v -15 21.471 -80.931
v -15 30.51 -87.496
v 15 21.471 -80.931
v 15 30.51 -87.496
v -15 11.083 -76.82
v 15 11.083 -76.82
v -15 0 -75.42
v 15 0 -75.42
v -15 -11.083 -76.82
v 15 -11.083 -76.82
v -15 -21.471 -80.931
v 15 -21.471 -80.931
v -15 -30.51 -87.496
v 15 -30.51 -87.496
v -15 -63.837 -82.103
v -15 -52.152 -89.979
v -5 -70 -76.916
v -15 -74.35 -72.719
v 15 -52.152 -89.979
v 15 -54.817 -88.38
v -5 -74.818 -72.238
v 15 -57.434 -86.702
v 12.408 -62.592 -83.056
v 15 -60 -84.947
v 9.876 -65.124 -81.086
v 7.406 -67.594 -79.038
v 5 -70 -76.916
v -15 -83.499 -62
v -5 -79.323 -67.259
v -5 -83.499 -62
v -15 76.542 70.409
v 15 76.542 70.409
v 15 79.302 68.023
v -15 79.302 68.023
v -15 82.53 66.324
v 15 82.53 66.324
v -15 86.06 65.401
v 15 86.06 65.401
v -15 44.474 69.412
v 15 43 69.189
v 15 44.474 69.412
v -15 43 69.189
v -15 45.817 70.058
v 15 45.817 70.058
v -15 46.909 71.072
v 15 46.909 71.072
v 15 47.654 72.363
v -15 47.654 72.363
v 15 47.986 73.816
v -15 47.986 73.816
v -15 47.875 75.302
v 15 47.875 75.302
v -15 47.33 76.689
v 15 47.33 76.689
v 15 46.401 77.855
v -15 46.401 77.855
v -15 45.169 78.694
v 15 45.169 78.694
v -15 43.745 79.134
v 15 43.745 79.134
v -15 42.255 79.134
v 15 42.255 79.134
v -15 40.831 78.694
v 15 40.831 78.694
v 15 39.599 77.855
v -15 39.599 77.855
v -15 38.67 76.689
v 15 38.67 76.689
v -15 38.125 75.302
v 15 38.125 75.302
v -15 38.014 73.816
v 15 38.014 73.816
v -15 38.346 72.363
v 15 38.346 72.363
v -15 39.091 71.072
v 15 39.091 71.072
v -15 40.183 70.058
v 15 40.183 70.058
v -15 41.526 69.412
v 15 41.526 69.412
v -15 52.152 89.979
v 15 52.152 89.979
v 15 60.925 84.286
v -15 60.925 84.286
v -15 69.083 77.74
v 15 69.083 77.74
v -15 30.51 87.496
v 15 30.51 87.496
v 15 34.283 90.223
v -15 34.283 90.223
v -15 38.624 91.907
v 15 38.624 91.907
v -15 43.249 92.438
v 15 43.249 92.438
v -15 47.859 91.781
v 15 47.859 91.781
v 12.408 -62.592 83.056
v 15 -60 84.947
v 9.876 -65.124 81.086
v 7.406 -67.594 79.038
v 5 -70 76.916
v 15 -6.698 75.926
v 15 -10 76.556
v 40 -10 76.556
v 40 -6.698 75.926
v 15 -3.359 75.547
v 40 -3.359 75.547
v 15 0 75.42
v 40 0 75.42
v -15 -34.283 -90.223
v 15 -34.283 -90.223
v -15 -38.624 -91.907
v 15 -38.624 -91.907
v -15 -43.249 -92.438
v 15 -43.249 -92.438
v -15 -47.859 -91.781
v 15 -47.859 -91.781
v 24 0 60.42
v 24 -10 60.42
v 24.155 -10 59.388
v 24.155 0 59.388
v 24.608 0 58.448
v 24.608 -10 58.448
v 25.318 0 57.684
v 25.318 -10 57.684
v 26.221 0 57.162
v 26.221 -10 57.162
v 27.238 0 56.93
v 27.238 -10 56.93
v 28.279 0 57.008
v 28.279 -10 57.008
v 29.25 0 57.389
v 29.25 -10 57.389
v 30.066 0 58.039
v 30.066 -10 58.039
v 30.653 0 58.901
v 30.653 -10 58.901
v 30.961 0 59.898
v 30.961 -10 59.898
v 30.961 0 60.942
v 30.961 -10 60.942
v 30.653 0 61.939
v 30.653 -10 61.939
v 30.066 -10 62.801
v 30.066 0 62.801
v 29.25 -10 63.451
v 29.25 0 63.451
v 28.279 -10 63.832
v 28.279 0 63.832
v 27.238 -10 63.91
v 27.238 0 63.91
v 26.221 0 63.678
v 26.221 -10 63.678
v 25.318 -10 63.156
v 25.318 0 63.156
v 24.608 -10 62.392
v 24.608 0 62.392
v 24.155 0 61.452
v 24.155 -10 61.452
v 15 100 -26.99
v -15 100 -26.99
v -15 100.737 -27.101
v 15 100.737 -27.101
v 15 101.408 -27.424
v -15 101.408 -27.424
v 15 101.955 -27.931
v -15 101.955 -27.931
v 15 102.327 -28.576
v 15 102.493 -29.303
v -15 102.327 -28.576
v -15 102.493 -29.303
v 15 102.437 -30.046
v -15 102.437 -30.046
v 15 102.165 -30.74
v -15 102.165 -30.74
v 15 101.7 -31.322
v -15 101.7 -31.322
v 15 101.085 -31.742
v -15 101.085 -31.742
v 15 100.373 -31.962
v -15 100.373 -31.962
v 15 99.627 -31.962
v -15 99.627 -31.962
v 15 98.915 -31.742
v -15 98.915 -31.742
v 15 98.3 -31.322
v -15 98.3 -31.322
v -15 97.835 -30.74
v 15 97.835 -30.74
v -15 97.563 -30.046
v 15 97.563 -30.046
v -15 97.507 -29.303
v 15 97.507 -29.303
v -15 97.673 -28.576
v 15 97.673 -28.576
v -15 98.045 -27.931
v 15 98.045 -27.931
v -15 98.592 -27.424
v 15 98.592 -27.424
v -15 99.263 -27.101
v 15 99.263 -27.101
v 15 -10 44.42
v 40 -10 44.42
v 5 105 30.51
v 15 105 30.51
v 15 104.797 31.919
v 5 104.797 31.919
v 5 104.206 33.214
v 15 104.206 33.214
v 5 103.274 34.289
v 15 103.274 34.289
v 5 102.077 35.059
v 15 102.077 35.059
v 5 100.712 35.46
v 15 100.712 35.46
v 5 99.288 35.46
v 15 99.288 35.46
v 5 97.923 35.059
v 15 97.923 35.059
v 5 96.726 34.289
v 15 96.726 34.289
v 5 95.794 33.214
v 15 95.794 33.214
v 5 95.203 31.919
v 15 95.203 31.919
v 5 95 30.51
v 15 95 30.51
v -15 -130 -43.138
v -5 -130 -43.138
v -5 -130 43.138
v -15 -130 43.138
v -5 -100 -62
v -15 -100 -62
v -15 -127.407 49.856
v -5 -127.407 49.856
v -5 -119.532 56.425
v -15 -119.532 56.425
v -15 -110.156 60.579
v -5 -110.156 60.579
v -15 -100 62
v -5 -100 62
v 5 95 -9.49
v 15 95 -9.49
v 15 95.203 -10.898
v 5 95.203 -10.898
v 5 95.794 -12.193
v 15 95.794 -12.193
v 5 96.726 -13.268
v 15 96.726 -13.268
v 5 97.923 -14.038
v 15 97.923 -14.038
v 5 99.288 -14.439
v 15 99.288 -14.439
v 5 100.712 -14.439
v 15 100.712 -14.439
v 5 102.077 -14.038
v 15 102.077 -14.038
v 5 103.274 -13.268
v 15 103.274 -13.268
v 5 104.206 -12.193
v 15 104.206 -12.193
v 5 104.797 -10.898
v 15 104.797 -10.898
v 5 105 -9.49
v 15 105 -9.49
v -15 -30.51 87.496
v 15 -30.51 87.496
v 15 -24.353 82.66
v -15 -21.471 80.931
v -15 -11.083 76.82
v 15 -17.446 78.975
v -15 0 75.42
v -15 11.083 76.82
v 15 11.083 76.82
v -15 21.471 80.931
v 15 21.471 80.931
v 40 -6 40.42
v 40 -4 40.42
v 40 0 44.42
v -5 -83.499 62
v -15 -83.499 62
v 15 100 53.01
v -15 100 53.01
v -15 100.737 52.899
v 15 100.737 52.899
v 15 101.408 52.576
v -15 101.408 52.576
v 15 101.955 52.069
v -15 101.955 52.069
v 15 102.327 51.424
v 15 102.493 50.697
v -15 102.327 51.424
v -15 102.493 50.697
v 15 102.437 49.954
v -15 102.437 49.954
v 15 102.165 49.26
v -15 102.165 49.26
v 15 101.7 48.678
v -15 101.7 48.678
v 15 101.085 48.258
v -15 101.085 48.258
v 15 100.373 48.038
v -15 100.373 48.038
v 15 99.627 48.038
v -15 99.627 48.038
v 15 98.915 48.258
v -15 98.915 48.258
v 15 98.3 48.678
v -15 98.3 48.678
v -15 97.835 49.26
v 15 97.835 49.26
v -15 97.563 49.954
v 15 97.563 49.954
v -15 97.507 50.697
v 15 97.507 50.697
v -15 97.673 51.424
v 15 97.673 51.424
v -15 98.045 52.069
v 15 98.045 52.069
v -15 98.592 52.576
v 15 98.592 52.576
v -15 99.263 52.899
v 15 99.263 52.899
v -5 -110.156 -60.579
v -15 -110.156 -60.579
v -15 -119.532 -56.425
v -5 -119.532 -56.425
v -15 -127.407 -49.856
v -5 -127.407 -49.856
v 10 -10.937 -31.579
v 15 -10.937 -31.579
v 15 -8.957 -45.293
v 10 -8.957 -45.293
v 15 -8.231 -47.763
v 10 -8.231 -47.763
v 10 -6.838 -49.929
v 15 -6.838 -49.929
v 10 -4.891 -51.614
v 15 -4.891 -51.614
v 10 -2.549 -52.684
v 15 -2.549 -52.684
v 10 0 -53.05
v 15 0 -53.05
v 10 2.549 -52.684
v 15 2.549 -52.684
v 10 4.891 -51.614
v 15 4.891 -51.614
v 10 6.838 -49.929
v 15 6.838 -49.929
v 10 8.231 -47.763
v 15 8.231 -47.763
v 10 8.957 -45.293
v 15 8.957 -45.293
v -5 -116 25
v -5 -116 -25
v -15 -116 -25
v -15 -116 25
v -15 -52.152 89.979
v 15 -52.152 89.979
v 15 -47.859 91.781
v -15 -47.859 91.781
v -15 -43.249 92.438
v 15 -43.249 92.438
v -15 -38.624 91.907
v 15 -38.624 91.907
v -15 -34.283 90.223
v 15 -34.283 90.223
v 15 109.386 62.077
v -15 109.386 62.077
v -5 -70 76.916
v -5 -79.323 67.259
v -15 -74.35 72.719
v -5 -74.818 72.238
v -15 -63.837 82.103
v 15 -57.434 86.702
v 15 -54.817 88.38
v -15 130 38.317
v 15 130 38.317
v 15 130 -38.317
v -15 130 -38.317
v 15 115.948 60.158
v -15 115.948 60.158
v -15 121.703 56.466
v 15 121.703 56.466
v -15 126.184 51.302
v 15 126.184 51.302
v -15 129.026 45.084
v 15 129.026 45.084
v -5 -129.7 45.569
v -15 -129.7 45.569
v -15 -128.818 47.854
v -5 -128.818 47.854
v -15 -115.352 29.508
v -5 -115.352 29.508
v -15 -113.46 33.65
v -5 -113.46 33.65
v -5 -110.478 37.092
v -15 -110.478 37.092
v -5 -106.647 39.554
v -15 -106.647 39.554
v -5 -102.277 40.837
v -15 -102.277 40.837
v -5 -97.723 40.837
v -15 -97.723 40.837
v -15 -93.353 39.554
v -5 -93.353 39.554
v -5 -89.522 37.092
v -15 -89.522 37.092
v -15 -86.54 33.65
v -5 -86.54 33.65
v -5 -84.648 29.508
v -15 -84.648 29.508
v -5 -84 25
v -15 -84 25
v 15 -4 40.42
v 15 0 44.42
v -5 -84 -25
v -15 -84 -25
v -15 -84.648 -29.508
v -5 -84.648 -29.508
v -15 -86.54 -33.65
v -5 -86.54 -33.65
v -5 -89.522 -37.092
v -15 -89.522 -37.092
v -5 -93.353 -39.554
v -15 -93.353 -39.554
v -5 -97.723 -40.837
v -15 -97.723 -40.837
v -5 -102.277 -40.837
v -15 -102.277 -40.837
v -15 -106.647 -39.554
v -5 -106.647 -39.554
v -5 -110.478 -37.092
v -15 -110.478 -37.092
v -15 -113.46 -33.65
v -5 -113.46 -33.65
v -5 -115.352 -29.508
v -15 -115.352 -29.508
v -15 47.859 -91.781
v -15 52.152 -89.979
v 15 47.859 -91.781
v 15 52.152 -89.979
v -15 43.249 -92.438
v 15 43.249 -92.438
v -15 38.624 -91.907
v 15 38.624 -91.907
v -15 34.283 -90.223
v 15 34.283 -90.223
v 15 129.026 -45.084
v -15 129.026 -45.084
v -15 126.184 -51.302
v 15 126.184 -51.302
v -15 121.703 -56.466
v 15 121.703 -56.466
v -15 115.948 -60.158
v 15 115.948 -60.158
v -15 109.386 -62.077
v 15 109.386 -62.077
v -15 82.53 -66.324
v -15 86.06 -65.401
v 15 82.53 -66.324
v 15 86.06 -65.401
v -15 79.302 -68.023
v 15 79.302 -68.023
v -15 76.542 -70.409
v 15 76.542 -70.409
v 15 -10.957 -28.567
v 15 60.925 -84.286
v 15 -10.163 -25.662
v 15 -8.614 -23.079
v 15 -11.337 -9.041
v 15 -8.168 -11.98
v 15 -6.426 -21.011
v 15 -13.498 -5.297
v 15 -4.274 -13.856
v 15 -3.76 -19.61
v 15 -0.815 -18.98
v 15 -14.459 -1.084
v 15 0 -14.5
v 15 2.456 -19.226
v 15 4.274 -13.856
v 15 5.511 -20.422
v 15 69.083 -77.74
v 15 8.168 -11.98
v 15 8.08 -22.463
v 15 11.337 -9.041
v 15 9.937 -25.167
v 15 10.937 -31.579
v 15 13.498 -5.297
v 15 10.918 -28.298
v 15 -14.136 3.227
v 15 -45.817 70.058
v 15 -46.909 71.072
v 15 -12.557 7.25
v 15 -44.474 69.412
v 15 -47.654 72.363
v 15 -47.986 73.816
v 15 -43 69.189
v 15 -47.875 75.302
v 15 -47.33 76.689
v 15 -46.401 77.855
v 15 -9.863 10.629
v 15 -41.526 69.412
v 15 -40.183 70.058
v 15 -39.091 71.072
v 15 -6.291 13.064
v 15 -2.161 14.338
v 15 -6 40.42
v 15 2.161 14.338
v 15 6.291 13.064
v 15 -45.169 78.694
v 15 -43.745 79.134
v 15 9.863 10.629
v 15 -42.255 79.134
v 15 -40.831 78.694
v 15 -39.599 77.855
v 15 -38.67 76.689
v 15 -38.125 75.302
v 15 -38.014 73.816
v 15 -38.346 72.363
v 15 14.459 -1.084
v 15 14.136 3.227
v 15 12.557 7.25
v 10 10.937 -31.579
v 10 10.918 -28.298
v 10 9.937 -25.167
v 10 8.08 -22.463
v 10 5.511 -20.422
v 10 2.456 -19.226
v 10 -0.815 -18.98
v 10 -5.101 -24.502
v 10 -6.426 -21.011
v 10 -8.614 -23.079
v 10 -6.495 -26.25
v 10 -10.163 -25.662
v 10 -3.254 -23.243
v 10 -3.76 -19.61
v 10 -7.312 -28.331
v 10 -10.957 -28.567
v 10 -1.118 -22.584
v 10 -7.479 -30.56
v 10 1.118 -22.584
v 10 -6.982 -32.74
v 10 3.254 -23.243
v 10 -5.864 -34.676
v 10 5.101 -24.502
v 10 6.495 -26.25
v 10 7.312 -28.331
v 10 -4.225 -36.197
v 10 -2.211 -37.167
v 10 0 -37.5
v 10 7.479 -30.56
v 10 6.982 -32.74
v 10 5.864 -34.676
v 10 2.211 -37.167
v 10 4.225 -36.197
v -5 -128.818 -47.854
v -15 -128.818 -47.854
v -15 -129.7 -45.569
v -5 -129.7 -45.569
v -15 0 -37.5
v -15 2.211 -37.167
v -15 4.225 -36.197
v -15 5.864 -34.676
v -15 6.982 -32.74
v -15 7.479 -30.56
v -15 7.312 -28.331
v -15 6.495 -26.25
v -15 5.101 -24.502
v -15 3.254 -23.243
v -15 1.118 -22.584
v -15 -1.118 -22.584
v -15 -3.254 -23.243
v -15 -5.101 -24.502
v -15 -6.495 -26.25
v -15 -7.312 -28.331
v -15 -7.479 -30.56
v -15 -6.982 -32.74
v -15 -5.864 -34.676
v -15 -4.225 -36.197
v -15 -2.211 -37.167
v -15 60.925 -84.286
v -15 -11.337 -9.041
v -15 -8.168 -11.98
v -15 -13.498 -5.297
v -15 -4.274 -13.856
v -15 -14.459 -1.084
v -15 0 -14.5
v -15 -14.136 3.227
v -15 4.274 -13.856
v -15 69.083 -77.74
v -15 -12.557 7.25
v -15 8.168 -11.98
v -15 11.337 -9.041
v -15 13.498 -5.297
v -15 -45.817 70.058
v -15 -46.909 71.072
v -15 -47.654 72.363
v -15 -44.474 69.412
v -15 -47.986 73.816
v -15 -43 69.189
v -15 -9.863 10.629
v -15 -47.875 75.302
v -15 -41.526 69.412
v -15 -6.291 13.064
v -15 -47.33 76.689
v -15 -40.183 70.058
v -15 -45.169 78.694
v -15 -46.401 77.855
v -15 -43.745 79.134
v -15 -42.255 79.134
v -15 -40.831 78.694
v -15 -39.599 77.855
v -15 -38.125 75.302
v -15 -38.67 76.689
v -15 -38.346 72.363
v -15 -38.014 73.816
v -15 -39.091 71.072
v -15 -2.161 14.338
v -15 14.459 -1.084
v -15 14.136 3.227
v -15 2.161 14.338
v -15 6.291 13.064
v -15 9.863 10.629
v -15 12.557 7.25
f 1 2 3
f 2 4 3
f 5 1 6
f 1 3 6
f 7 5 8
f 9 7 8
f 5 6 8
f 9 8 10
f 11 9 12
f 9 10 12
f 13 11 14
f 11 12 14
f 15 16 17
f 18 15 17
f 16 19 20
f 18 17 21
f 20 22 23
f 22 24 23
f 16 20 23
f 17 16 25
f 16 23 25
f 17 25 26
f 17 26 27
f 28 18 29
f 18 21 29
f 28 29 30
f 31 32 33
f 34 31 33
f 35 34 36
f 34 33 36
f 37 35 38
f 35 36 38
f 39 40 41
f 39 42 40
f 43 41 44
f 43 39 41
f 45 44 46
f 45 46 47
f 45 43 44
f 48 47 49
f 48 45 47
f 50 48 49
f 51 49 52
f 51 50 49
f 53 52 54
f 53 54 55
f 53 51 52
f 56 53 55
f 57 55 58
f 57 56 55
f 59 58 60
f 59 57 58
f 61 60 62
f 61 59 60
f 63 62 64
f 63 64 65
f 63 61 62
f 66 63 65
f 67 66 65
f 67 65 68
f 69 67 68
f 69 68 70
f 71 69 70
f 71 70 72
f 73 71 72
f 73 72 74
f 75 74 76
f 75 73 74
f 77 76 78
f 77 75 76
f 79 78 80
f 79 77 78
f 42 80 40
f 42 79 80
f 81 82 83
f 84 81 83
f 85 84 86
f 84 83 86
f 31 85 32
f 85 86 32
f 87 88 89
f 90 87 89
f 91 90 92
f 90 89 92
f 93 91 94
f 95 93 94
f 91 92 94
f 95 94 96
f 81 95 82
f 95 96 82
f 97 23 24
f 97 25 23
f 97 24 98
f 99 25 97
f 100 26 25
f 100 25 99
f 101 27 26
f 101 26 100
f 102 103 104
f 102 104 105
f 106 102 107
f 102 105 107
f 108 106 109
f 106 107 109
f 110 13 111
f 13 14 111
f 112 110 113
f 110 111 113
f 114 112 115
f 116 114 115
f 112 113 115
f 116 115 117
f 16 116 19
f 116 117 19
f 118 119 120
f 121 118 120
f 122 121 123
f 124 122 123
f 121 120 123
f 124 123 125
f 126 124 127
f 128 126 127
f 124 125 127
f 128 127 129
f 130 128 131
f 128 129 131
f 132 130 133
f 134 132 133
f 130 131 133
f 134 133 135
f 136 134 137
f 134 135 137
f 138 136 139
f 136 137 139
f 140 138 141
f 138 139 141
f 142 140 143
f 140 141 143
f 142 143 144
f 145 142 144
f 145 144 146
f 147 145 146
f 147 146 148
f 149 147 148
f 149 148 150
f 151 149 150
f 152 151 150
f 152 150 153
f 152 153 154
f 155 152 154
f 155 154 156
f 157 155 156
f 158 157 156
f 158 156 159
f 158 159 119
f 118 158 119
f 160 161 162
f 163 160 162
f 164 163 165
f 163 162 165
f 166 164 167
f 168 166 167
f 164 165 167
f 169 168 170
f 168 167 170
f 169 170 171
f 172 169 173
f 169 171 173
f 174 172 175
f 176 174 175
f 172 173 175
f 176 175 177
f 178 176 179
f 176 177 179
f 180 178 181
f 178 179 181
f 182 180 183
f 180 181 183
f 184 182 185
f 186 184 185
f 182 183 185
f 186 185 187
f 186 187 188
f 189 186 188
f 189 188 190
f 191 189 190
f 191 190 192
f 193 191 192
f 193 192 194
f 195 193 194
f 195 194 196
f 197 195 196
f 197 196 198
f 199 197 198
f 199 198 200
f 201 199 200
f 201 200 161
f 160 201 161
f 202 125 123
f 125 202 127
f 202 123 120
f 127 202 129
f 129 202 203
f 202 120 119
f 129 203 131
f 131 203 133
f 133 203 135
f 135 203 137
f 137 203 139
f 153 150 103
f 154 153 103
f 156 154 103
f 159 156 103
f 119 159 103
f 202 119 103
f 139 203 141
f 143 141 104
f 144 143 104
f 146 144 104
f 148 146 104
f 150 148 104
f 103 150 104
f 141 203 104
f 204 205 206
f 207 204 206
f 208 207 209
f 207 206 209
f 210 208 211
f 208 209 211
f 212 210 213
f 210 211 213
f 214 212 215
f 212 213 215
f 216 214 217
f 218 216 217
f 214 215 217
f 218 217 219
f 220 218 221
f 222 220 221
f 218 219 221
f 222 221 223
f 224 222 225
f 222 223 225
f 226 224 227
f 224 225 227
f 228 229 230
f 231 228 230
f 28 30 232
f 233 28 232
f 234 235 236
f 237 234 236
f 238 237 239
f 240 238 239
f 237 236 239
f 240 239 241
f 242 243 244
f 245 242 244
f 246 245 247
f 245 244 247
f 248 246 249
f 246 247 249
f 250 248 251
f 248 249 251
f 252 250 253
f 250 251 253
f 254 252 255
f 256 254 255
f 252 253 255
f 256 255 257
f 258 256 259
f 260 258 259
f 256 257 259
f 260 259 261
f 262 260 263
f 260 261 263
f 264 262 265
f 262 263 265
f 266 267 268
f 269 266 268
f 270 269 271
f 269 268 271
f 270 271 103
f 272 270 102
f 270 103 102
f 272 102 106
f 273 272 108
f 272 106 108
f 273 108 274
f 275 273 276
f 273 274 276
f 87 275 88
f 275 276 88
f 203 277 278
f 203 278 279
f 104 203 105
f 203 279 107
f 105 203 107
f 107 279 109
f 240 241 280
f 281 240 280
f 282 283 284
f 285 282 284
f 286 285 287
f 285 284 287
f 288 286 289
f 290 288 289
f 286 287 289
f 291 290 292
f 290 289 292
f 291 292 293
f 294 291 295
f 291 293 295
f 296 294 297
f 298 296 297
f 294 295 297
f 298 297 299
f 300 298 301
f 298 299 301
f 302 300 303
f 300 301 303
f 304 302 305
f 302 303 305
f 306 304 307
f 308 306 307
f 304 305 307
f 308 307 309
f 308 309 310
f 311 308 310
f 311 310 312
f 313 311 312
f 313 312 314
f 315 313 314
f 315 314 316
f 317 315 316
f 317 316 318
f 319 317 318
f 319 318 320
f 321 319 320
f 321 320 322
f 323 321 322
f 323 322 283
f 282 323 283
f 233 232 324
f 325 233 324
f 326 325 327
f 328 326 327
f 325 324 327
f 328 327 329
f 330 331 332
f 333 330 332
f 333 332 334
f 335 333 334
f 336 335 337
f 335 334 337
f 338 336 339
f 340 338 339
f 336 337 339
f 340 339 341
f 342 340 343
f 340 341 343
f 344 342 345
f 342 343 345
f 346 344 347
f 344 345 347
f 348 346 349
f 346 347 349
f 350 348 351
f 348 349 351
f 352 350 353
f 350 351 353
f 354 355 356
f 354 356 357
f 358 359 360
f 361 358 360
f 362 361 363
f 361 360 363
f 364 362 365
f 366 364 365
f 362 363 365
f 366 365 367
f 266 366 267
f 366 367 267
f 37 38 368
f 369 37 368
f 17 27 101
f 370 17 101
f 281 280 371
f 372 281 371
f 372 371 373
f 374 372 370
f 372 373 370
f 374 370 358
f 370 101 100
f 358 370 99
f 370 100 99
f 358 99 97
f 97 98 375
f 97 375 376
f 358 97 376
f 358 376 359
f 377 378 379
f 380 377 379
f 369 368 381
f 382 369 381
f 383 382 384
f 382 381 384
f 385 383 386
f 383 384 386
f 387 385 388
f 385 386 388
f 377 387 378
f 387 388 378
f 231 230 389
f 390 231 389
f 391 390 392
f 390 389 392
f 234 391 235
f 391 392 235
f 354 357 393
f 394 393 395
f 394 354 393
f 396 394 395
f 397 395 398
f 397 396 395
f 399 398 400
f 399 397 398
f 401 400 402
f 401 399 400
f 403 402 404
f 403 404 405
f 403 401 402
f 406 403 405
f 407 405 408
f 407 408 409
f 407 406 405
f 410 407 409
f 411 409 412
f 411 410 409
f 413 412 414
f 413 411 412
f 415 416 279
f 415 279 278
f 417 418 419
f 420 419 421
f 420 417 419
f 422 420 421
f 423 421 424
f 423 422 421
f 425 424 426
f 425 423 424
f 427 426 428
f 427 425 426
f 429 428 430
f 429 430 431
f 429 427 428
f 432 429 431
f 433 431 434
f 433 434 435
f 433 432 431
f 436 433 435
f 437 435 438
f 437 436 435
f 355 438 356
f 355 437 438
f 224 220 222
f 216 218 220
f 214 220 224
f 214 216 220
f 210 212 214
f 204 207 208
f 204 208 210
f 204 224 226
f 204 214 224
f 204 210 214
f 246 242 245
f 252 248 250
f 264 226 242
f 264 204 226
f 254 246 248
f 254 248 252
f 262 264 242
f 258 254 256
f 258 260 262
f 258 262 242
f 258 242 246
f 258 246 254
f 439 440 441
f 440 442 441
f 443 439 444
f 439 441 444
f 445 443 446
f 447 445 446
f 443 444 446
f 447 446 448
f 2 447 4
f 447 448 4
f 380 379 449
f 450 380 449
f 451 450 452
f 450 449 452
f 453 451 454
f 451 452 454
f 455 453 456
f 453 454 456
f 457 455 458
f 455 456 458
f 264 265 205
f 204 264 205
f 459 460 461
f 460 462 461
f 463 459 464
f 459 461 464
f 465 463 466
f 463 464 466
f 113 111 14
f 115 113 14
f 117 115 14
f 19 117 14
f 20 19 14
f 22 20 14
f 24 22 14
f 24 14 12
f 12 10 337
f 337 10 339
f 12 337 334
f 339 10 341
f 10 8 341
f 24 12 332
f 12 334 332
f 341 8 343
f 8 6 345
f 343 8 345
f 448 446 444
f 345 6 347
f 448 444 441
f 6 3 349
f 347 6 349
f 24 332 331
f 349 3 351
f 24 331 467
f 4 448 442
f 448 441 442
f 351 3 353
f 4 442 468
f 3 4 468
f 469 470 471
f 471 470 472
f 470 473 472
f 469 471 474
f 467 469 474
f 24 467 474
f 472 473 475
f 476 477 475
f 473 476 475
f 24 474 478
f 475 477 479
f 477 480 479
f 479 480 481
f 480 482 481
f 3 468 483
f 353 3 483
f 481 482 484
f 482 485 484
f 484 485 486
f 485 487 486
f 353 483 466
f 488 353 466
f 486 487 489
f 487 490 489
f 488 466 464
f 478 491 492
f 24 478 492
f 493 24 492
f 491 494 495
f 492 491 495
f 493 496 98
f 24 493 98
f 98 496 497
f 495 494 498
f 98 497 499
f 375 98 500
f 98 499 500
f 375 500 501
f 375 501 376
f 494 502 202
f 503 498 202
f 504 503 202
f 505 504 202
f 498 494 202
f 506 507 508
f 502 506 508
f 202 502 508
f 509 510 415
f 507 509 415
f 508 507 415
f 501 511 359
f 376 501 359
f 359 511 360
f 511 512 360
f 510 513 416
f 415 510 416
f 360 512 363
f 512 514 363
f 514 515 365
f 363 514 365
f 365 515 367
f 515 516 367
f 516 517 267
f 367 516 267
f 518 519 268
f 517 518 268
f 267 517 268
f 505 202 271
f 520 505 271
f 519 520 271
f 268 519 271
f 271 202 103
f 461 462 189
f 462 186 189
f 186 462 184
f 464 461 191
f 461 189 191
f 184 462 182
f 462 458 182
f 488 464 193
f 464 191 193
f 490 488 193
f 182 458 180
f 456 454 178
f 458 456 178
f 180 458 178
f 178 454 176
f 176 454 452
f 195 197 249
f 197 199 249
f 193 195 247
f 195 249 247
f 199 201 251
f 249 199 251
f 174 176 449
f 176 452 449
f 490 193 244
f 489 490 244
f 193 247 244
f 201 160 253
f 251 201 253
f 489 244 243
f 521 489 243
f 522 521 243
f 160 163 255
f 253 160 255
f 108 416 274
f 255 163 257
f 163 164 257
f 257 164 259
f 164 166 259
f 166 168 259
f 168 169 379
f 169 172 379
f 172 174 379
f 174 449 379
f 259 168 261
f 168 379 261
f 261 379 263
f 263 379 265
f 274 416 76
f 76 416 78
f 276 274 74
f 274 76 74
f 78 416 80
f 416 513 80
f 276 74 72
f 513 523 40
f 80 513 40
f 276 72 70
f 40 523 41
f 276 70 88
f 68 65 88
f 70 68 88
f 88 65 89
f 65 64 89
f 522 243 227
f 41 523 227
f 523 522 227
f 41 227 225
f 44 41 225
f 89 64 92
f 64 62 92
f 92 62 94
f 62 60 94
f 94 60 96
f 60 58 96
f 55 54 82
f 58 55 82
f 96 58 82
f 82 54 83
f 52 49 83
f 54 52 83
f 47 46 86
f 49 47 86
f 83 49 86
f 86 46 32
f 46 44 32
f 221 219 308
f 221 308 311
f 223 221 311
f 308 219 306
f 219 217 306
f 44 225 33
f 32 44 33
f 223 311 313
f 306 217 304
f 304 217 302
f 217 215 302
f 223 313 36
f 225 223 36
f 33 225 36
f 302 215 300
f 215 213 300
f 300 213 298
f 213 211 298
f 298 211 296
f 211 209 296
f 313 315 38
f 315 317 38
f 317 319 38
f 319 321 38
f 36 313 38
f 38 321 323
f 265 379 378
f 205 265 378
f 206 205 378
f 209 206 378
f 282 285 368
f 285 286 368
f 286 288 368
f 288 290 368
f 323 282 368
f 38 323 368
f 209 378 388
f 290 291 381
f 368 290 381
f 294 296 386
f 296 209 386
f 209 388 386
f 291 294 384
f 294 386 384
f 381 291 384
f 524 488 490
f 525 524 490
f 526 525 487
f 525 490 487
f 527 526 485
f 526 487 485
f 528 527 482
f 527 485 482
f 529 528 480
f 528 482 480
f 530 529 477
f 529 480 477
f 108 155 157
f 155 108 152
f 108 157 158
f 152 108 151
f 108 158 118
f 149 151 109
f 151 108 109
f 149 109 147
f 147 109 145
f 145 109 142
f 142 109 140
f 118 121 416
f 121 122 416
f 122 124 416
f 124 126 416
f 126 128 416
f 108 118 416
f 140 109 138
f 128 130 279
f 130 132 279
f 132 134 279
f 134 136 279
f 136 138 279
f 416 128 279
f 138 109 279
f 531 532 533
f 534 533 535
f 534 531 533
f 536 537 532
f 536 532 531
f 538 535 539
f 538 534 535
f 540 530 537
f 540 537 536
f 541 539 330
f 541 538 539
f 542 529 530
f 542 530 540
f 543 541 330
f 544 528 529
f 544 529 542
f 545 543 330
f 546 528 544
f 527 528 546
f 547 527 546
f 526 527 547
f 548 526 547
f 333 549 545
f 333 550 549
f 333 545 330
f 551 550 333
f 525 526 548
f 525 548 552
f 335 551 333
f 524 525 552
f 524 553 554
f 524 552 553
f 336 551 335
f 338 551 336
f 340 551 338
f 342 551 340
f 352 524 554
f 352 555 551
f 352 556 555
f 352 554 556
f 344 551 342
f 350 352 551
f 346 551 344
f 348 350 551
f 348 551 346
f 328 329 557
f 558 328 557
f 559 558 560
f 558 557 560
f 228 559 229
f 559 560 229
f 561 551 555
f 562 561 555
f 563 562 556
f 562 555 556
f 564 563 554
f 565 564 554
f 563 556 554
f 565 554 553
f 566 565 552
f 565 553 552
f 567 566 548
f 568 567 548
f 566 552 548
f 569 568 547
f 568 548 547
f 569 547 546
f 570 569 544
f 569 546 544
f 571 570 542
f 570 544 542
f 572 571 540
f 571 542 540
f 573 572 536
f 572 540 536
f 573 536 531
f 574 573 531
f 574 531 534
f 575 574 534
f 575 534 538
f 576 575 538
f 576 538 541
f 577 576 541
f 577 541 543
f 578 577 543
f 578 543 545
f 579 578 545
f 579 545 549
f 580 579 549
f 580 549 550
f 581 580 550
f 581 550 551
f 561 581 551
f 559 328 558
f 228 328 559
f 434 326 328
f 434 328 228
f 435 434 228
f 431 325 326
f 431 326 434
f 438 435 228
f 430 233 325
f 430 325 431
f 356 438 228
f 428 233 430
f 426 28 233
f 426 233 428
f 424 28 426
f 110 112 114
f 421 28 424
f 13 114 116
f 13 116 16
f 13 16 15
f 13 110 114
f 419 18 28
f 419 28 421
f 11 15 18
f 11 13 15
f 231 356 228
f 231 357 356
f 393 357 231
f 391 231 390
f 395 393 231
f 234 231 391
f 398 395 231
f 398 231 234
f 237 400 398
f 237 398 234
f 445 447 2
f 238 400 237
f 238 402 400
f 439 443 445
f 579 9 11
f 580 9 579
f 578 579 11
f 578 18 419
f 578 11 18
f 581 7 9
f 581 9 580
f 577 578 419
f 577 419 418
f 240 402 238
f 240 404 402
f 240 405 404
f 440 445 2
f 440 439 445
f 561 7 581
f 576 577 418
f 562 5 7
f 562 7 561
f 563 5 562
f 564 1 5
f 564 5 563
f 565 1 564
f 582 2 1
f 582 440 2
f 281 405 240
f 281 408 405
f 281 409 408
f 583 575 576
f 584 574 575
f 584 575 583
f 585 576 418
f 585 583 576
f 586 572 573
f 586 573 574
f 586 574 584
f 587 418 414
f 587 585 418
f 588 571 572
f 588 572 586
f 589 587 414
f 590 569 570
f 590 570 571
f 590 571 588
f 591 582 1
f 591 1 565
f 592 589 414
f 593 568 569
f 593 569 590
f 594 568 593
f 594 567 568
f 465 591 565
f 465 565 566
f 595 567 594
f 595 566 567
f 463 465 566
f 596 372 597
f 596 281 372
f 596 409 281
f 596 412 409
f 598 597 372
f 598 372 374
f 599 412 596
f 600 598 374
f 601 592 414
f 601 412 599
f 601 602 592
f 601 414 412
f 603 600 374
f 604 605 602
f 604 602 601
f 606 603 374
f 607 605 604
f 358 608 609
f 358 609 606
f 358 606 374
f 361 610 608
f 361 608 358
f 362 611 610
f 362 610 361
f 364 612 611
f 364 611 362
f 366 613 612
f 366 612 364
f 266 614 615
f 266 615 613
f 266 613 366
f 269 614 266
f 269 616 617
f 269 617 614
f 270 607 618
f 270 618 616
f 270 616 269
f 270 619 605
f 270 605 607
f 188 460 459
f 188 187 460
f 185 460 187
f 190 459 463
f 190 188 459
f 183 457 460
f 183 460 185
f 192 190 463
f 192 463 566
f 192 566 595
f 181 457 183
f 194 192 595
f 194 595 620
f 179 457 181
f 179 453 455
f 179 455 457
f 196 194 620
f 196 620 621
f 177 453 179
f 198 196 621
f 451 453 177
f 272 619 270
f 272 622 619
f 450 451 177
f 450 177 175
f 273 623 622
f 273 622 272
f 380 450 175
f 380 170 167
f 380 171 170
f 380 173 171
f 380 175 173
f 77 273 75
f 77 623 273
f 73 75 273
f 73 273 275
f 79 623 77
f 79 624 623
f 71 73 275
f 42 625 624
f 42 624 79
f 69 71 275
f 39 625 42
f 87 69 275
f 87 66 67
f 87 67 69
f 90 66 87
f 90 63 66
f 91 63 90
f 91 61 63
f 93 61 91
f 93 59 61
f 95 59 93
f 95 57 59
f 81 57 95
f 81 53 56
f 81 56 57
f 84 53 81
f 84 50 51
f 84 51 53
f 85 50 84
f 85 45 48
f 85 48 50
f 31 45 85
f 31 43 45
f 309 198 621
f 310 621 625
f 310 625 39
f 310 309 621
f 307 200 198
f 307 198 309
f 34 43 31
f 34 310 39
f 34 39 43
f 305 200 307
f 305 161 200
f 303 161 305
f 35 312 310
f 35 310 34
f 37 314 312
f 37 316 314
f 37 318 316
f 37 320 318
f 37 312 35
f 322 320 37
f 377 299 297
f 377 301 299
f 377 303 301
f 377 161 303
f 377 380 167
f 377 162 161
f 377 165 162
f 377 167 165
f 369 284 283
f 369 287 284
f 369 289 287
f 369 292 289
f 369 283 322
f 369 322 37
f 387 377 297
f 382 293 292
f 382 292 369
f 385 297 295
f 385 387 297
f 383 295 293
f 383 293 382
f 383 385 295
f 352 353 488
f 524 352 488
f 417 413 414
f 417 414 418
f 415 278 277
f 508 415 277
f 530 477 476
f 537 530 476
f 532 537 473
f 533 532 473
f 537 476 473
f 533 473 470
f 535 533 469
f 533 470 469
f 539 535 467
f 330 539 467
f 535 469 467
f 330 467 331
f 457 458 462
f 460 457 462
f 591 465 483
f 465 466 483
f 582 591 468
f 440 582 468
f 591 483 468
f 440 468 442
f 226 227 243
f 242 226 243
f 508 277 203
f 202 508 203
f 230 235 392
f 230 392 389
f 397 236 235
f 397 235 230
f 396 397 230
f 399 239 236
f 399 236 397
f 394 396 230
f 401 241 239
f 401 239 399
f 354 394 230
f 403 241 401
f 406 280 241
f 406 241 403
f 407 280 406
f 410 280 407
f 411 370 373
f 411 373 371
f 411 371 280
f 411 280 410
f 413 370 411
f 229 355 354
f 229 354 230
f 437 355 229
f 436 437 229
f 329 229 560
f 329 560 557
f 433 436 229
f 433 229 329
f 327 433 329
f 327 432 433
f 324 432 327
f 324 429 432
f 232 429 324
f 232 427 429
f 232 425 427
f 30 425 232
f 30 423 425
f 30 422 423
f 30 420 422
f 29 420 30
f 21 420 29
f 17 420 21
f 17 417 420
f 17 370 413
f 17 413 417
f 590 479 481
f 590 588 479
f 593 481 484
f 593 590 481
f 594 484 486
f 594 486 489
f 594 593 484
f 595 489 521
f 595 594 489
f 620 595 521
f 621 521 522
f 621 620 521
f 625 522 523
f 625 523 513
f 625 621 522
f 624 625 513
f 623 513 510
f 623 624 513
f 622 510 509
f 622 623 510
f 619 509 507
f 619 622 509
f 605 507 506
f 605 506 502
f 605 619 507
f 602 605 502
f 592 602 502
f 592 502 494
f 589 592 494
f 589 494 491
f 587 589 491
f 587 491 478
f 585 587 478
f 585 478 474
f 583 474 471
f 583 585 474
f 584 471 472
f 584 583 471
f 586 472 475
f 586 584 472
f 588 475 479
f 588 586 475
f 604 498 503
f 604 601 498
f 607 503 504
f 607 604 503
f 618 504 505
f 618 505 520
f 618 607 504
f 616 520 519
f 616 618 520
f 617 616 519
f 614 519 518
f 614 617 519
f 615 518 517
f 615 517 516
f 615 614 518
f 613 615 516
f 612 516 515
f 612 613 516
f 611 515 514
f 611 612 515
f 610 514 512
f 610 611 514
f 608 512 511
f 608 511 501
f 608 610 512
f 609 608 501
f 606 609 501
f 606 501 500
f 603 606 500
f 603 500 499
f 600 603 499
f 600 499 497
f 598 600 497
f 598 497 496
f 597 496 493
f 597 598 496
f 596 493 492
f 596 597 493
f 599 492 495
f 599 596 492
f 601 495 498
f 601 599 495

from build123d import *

# Parameters (mm, degrees)
SZKIC1_R                       = 14.5
SZKIC1_R_2                     = 5
DODANIE_WYCI_GNI_CIE1_DEPTH    = 15
M6_TAPPED_HOLE1_D              = 5
DODANIE_WYCI_GNI_CIE3_START    = -25
DODANIE_WYCI_GNI_CIE3_DEPTH    = 25
OTW_R_GWINTOWANY_M8X1_01_D     = 7
OTW_R_GWINTOWANY_M8X1_01_DEPTH = 18.896987833
OTW_R_GWINTOWANY_M8X1_01_TIP   = 2.103012167
WYTNIJ_WYCI_GNI_CIE2_DEPTH     = 10
WYTNIJ_WYCI_GNI_CIE4_DEPTH     = 20
SFAZOWANIE4_SIZE               = 10
WYTNIJ_WYCI_GNI_CIE5_DEPTH     = 5
SZKIC17_5_R                    = 7.5
WYTNIJ_WYCI_GNI_CIE6_DEPTH     = 163.311542951


with BuildPart() as part:
    # Szkic1 → Dodanie-wyciągnięcie1 (new, symmetric)
    with BuildSketch(Plane(origin=(0, 0, 0), x_dir=(0, 0, -1), z_dir=(1, 0, 0))):
        with BuildLine():
            Line((62.076569761, 109.385977671), (65.40069858, 86.060032436))
            ThreePointArc((65.40069858, 86.060032436), (67.080888035, 80.867469231), (70.408575711, 76.541704099))
            ThreePointArc((70.408575711, 76.541704099), (81.115709466, 65.086416999), (89.978943384, 52.151603499))
            ThreePointArc((89.978943384, 52.151603499), (92.32041193, 40.919666146), (87.495806927, 30.50995538))
            ThreePointArc((87.495806927, 30.50995538), (75.419960244, 0), (87.495806927, -30.50995538))
            ThreePointArc((87.495806927, -30.50995538), (92.32041193, -40.919666146), (89.978943384, -52.151603499))
            ThreePointArc((89.978943384, -52.151603499), (77.589025222, -69.25274843), (62, -83.498502981))
            Line((62, -83.498502981), (62, -100))
            ThreePointArc((62, -100), (58.828108774, -114.988630917), (49.856267202, -127.407407407))
            ThreePointArc((49.856267202, -127.407407407), (46.738768646, -129.329364235), (43.138357147, -130))
            Line((43.138357147, -130), (25, -130))
            Line((25, -130), (-25, -130))
            Line((-25, -130), (-43.138357147, -130))
            ThreePointArc((-43.138357147, -130), (-46.738768646, -129.329364235), (-49.856267202, -127.407407407))
            ThreePointArc((-49.856267202, -127.407407407), (-58.828108774, -114.988630917), (-62, -100))
            Line((-62, -100), (-62, -83.498502981))
            ThreePointArc((-62, -83.498502981), (-77.589025222, -69.25274843), (-89.978943384, -52.151603499))
            ThreePointArc((-89.978943384, -52.151603499), (-92.32041193, -40.919666146), (-87.495806927, -30.50995538))
            ThreePointArc((-87.495806927, -30.50995538), (-75.419960244, 0), (-87.495806927, 30.50995538))
            ThreePointArc((-87.495806927, 30.50995538), (-92.32041193, 40.919666146), (-89.978943384, 52.151603499))
            ThreePointArc((-89.978943384, 52.151603499), (-81.115709466, 65.086416999), (-70.408575711, 76.541704099))
            ThreePointArc((-70.408575711, 76.541704099), (-67.080888035, 80.867469231), (-65.40069858, 86.060032436))
            Line((-65.40069858, 86.060032436), (-62.076569761, 109.385977671))
            ThreePointArc((-62.076569761, 109.385977671), (-54.044566654, 124.12820267), (-38.316621209, 130))
            Line((-38.316621209, 130), (38.316621209, 130))
            ThreePointArc((38.316621209, 130), (54.044566654, 124.12820267), (62.076569761, 109.385977671))
        make_face()
        Circle(SZKIC1_R, mode=Mode.SUBTRACT)
        with Locations((-74.189369185, 43)):
            Circle(SZKIC1_R_2, mode=Mode.SUBTRACT)
        with Locations((-74.189369185, -43)):
            Circle(SZKIC1_R_2, mode=Mode.SUBTRACT)
        with BuildLine():
            Line((-25, -84), (25, -84))
            ThreePointArc((25, -84), (41, -100), (25, -116))
            Line((25, -116), (-25, -116))
            ThreePointArc((-25, -116), (-41, -100), (-25, -84))
        make_face(mode=Mode.SUBTRACT)
    extrude(amount=DODANIE_WYCI_GNI_CIE1_DEPTH, both=True)

    # M6 Tapped Hole1 (through all)
    with Locations(Plane(origin=(15, 0, 0), x_dir=(0, 0, -1), z_dir=(1, 0, 0))):
        with Locations((-50.510423527, 100), (29.489576473, 100)):
            Hole(M6_TAPPED_HOLE1_D / 2)

    # Szkic5 → Dodanie-wyciągnięcie3 (add)
    with BuildSketch(Plane.ZY.offset(-15).offset(DODANIE_WYCI_GNI_CIE3_START)):
        with BuildLine():
            Line((75.419960244, 0), (44.419960244, 0))
            Line((44.419960244, 0), (40.419960244, -4))
            Line((40.419960244, -4), (40.419960244, -6))
            Line((40.419960244, -6), (44.419960244, -10))
            Line((44.419960244, -10), (76.556013712, -10))
            ThreePointArc((76.556013712, -10), (75.704884126, -5.032161998), (75.419960244, 0))
        make_face()
    extrude(amount=DODANIE_WYCI_GNI_CIE3_DEPTH)

    # Otwór gwintowany M8x1.01
    with Locations(Plane(origin=(0, 0, 0), x_dir=(1, 0, 0), z_dir=(0, 1, 0))):
        with Locations((27.5, -60.419960244)):
            Hole(OTW_R_GWINTOWANY_M8X1_01_D / 2, depth=OTW_R_GWINTOWANY_M8X1_01_DEPTH)
            with Locations((0, 0, -(OTW_R_GWINTOWANY_M8X1_01_DEPTH + OTW_R_GWINTOWANY_M8X1_01_TIP / 2))):  # 118° drill point
                Cone(0, OTW_R_GWINTOWANY_M8X1_01_D / 2, OTW_R_GWINTOWANY_M8X1_01_TIP, mode=Mode.SUBTRACT)

    # Szkic12 → Wytnij-wyciągnięcie2 (cut)
    with BuildSketch(Plane(origin=(15, 0, 0), x_dir=(0, 0, -1), z_dir=(1, 0, 0))):
        with BuildLine():
            Line((9.489576473, 105), (-30.510423527, 105))
            ThreePointArc((-30.510423527, 105), (-35.510423527, 100), (-30.510423527, 95))
            Line((-30.510423527, 95), (9.489576473, 95))
            ThreePointArc((9.489576473, 95), (14.489576473, 100), (9.489576473, 105))
        make_face()
    extrude(amount=-WYTNIJ_WYCI_GNI_CIE2_DEPTH, mode=Mode.SUBTRACT)

    # Szkic16 → Wytnij-wyciągnięcie4 (cut)
    with BuildSketch(Plane(origin=(15, 0, 0), x_dir=(0, 0, -1), z_dir=(1, 0, 0))):
        with BuildLine():
            Line((-43.138357147, -130), (43.138357147, -130))
            ThreePointArc((43.138357147, -130), (46.738768646, -129.329364235), (49.856267202, -127.407407407))
            ThreePointArc((49.856267202, -127.407407407), (58.828108774, -114.988630917), (62, -100))
            Line((62, -100), (62, -83.498502981))
            ThreePointArc((62, -83.498502981), (69.784912958, -77.110738056), (76.915538092, -70))
            Line((76.915538092, -70), (-76.915538092, -70))
            ThreePointArc((-76.915538092, -70), (-69.784912958, -77.110738056), (-62, -83.498502981))
            Line((-62, -83.498502981), (-62, -100))
            ThreePointArc((-62, -100), (-58.828108774, -114.988630917), (-49.856267202, -127.407407407))
            ThreePointArc((-49.856267202, -127.407407407), (-46.738768646, -129.329364235), (-43.138357147, -130))
        make_face()
        with BuildLine():
            Line((-25, -116), (25, -116))
            ThreePointArc((25, -116), (41, -100), (25, -84))
            Line((25, -84), (-25, -84))
            ThreePointArc((-25, -84), (-41, -100), (-25, -116))
        make_face(mode=Mode.SUBTRACT)
    extrude(amount=-WYTNIJ_WYCI_GNI_CIE4_DEPTH, mode=Mode.SUBTRACT)

    # Sfazowanie4
    sfazowanie4_edges = [part.edges().sort_by_distance(p)[0] for p in [
        (15, -70, 0),
    ]]
    chamfer(sfazowanie4_edges, length=SFAZOWANIE4_SIZE)

    # Szkic17 → Wytnij-wyciągnięcie5 (cut)
    with BuildSketch(Plane(origin=(15, 0, 0), x_dir=(0, 0, -1), z_dir=(1, 0, 0))):
        with BuildLine():
            Line((31.578571429, -10.936663671), (45.292857143, -8.957177034))
            ThreePointArc((45.292857143, -8.957177034), (53.05, 0), (45.292857142, 8.957177033))
            Line((45.292857142, 8.957177033), (31.578571428, 10.93666367))
            ThreePointArc((31.578571428, 10.93666367), (22.462605729, 8.080234378), (18.98012619, -0.815402484))
            ThreePointArc((18.98012619, -0.815402484), (23.079412621, -8.614404816), (31.578571429, -10.936663671))
        make_face()
    extrude(amount=-WYTNIJ_WYCI_GNI_CIE5_DEPTH, mode=Mode.SUBTRACT)

    # Szkic17<5> → Wytnij-wyciągnięcie6 (cut, through all)
    with BuildSketch(Plane(origin=(15, 0, 0), x_dir=(0, 0, -1), z_dir=(1, 0, 0))):
        with Locations((30, -1e-09)):
            Circle(SZKIC17_5_R)
    extrude(amount=-WYTNIJ_WYCI_GNI_CIE6_DEPTH, mode=Mode.SUBTRACT)


solid = part.part
